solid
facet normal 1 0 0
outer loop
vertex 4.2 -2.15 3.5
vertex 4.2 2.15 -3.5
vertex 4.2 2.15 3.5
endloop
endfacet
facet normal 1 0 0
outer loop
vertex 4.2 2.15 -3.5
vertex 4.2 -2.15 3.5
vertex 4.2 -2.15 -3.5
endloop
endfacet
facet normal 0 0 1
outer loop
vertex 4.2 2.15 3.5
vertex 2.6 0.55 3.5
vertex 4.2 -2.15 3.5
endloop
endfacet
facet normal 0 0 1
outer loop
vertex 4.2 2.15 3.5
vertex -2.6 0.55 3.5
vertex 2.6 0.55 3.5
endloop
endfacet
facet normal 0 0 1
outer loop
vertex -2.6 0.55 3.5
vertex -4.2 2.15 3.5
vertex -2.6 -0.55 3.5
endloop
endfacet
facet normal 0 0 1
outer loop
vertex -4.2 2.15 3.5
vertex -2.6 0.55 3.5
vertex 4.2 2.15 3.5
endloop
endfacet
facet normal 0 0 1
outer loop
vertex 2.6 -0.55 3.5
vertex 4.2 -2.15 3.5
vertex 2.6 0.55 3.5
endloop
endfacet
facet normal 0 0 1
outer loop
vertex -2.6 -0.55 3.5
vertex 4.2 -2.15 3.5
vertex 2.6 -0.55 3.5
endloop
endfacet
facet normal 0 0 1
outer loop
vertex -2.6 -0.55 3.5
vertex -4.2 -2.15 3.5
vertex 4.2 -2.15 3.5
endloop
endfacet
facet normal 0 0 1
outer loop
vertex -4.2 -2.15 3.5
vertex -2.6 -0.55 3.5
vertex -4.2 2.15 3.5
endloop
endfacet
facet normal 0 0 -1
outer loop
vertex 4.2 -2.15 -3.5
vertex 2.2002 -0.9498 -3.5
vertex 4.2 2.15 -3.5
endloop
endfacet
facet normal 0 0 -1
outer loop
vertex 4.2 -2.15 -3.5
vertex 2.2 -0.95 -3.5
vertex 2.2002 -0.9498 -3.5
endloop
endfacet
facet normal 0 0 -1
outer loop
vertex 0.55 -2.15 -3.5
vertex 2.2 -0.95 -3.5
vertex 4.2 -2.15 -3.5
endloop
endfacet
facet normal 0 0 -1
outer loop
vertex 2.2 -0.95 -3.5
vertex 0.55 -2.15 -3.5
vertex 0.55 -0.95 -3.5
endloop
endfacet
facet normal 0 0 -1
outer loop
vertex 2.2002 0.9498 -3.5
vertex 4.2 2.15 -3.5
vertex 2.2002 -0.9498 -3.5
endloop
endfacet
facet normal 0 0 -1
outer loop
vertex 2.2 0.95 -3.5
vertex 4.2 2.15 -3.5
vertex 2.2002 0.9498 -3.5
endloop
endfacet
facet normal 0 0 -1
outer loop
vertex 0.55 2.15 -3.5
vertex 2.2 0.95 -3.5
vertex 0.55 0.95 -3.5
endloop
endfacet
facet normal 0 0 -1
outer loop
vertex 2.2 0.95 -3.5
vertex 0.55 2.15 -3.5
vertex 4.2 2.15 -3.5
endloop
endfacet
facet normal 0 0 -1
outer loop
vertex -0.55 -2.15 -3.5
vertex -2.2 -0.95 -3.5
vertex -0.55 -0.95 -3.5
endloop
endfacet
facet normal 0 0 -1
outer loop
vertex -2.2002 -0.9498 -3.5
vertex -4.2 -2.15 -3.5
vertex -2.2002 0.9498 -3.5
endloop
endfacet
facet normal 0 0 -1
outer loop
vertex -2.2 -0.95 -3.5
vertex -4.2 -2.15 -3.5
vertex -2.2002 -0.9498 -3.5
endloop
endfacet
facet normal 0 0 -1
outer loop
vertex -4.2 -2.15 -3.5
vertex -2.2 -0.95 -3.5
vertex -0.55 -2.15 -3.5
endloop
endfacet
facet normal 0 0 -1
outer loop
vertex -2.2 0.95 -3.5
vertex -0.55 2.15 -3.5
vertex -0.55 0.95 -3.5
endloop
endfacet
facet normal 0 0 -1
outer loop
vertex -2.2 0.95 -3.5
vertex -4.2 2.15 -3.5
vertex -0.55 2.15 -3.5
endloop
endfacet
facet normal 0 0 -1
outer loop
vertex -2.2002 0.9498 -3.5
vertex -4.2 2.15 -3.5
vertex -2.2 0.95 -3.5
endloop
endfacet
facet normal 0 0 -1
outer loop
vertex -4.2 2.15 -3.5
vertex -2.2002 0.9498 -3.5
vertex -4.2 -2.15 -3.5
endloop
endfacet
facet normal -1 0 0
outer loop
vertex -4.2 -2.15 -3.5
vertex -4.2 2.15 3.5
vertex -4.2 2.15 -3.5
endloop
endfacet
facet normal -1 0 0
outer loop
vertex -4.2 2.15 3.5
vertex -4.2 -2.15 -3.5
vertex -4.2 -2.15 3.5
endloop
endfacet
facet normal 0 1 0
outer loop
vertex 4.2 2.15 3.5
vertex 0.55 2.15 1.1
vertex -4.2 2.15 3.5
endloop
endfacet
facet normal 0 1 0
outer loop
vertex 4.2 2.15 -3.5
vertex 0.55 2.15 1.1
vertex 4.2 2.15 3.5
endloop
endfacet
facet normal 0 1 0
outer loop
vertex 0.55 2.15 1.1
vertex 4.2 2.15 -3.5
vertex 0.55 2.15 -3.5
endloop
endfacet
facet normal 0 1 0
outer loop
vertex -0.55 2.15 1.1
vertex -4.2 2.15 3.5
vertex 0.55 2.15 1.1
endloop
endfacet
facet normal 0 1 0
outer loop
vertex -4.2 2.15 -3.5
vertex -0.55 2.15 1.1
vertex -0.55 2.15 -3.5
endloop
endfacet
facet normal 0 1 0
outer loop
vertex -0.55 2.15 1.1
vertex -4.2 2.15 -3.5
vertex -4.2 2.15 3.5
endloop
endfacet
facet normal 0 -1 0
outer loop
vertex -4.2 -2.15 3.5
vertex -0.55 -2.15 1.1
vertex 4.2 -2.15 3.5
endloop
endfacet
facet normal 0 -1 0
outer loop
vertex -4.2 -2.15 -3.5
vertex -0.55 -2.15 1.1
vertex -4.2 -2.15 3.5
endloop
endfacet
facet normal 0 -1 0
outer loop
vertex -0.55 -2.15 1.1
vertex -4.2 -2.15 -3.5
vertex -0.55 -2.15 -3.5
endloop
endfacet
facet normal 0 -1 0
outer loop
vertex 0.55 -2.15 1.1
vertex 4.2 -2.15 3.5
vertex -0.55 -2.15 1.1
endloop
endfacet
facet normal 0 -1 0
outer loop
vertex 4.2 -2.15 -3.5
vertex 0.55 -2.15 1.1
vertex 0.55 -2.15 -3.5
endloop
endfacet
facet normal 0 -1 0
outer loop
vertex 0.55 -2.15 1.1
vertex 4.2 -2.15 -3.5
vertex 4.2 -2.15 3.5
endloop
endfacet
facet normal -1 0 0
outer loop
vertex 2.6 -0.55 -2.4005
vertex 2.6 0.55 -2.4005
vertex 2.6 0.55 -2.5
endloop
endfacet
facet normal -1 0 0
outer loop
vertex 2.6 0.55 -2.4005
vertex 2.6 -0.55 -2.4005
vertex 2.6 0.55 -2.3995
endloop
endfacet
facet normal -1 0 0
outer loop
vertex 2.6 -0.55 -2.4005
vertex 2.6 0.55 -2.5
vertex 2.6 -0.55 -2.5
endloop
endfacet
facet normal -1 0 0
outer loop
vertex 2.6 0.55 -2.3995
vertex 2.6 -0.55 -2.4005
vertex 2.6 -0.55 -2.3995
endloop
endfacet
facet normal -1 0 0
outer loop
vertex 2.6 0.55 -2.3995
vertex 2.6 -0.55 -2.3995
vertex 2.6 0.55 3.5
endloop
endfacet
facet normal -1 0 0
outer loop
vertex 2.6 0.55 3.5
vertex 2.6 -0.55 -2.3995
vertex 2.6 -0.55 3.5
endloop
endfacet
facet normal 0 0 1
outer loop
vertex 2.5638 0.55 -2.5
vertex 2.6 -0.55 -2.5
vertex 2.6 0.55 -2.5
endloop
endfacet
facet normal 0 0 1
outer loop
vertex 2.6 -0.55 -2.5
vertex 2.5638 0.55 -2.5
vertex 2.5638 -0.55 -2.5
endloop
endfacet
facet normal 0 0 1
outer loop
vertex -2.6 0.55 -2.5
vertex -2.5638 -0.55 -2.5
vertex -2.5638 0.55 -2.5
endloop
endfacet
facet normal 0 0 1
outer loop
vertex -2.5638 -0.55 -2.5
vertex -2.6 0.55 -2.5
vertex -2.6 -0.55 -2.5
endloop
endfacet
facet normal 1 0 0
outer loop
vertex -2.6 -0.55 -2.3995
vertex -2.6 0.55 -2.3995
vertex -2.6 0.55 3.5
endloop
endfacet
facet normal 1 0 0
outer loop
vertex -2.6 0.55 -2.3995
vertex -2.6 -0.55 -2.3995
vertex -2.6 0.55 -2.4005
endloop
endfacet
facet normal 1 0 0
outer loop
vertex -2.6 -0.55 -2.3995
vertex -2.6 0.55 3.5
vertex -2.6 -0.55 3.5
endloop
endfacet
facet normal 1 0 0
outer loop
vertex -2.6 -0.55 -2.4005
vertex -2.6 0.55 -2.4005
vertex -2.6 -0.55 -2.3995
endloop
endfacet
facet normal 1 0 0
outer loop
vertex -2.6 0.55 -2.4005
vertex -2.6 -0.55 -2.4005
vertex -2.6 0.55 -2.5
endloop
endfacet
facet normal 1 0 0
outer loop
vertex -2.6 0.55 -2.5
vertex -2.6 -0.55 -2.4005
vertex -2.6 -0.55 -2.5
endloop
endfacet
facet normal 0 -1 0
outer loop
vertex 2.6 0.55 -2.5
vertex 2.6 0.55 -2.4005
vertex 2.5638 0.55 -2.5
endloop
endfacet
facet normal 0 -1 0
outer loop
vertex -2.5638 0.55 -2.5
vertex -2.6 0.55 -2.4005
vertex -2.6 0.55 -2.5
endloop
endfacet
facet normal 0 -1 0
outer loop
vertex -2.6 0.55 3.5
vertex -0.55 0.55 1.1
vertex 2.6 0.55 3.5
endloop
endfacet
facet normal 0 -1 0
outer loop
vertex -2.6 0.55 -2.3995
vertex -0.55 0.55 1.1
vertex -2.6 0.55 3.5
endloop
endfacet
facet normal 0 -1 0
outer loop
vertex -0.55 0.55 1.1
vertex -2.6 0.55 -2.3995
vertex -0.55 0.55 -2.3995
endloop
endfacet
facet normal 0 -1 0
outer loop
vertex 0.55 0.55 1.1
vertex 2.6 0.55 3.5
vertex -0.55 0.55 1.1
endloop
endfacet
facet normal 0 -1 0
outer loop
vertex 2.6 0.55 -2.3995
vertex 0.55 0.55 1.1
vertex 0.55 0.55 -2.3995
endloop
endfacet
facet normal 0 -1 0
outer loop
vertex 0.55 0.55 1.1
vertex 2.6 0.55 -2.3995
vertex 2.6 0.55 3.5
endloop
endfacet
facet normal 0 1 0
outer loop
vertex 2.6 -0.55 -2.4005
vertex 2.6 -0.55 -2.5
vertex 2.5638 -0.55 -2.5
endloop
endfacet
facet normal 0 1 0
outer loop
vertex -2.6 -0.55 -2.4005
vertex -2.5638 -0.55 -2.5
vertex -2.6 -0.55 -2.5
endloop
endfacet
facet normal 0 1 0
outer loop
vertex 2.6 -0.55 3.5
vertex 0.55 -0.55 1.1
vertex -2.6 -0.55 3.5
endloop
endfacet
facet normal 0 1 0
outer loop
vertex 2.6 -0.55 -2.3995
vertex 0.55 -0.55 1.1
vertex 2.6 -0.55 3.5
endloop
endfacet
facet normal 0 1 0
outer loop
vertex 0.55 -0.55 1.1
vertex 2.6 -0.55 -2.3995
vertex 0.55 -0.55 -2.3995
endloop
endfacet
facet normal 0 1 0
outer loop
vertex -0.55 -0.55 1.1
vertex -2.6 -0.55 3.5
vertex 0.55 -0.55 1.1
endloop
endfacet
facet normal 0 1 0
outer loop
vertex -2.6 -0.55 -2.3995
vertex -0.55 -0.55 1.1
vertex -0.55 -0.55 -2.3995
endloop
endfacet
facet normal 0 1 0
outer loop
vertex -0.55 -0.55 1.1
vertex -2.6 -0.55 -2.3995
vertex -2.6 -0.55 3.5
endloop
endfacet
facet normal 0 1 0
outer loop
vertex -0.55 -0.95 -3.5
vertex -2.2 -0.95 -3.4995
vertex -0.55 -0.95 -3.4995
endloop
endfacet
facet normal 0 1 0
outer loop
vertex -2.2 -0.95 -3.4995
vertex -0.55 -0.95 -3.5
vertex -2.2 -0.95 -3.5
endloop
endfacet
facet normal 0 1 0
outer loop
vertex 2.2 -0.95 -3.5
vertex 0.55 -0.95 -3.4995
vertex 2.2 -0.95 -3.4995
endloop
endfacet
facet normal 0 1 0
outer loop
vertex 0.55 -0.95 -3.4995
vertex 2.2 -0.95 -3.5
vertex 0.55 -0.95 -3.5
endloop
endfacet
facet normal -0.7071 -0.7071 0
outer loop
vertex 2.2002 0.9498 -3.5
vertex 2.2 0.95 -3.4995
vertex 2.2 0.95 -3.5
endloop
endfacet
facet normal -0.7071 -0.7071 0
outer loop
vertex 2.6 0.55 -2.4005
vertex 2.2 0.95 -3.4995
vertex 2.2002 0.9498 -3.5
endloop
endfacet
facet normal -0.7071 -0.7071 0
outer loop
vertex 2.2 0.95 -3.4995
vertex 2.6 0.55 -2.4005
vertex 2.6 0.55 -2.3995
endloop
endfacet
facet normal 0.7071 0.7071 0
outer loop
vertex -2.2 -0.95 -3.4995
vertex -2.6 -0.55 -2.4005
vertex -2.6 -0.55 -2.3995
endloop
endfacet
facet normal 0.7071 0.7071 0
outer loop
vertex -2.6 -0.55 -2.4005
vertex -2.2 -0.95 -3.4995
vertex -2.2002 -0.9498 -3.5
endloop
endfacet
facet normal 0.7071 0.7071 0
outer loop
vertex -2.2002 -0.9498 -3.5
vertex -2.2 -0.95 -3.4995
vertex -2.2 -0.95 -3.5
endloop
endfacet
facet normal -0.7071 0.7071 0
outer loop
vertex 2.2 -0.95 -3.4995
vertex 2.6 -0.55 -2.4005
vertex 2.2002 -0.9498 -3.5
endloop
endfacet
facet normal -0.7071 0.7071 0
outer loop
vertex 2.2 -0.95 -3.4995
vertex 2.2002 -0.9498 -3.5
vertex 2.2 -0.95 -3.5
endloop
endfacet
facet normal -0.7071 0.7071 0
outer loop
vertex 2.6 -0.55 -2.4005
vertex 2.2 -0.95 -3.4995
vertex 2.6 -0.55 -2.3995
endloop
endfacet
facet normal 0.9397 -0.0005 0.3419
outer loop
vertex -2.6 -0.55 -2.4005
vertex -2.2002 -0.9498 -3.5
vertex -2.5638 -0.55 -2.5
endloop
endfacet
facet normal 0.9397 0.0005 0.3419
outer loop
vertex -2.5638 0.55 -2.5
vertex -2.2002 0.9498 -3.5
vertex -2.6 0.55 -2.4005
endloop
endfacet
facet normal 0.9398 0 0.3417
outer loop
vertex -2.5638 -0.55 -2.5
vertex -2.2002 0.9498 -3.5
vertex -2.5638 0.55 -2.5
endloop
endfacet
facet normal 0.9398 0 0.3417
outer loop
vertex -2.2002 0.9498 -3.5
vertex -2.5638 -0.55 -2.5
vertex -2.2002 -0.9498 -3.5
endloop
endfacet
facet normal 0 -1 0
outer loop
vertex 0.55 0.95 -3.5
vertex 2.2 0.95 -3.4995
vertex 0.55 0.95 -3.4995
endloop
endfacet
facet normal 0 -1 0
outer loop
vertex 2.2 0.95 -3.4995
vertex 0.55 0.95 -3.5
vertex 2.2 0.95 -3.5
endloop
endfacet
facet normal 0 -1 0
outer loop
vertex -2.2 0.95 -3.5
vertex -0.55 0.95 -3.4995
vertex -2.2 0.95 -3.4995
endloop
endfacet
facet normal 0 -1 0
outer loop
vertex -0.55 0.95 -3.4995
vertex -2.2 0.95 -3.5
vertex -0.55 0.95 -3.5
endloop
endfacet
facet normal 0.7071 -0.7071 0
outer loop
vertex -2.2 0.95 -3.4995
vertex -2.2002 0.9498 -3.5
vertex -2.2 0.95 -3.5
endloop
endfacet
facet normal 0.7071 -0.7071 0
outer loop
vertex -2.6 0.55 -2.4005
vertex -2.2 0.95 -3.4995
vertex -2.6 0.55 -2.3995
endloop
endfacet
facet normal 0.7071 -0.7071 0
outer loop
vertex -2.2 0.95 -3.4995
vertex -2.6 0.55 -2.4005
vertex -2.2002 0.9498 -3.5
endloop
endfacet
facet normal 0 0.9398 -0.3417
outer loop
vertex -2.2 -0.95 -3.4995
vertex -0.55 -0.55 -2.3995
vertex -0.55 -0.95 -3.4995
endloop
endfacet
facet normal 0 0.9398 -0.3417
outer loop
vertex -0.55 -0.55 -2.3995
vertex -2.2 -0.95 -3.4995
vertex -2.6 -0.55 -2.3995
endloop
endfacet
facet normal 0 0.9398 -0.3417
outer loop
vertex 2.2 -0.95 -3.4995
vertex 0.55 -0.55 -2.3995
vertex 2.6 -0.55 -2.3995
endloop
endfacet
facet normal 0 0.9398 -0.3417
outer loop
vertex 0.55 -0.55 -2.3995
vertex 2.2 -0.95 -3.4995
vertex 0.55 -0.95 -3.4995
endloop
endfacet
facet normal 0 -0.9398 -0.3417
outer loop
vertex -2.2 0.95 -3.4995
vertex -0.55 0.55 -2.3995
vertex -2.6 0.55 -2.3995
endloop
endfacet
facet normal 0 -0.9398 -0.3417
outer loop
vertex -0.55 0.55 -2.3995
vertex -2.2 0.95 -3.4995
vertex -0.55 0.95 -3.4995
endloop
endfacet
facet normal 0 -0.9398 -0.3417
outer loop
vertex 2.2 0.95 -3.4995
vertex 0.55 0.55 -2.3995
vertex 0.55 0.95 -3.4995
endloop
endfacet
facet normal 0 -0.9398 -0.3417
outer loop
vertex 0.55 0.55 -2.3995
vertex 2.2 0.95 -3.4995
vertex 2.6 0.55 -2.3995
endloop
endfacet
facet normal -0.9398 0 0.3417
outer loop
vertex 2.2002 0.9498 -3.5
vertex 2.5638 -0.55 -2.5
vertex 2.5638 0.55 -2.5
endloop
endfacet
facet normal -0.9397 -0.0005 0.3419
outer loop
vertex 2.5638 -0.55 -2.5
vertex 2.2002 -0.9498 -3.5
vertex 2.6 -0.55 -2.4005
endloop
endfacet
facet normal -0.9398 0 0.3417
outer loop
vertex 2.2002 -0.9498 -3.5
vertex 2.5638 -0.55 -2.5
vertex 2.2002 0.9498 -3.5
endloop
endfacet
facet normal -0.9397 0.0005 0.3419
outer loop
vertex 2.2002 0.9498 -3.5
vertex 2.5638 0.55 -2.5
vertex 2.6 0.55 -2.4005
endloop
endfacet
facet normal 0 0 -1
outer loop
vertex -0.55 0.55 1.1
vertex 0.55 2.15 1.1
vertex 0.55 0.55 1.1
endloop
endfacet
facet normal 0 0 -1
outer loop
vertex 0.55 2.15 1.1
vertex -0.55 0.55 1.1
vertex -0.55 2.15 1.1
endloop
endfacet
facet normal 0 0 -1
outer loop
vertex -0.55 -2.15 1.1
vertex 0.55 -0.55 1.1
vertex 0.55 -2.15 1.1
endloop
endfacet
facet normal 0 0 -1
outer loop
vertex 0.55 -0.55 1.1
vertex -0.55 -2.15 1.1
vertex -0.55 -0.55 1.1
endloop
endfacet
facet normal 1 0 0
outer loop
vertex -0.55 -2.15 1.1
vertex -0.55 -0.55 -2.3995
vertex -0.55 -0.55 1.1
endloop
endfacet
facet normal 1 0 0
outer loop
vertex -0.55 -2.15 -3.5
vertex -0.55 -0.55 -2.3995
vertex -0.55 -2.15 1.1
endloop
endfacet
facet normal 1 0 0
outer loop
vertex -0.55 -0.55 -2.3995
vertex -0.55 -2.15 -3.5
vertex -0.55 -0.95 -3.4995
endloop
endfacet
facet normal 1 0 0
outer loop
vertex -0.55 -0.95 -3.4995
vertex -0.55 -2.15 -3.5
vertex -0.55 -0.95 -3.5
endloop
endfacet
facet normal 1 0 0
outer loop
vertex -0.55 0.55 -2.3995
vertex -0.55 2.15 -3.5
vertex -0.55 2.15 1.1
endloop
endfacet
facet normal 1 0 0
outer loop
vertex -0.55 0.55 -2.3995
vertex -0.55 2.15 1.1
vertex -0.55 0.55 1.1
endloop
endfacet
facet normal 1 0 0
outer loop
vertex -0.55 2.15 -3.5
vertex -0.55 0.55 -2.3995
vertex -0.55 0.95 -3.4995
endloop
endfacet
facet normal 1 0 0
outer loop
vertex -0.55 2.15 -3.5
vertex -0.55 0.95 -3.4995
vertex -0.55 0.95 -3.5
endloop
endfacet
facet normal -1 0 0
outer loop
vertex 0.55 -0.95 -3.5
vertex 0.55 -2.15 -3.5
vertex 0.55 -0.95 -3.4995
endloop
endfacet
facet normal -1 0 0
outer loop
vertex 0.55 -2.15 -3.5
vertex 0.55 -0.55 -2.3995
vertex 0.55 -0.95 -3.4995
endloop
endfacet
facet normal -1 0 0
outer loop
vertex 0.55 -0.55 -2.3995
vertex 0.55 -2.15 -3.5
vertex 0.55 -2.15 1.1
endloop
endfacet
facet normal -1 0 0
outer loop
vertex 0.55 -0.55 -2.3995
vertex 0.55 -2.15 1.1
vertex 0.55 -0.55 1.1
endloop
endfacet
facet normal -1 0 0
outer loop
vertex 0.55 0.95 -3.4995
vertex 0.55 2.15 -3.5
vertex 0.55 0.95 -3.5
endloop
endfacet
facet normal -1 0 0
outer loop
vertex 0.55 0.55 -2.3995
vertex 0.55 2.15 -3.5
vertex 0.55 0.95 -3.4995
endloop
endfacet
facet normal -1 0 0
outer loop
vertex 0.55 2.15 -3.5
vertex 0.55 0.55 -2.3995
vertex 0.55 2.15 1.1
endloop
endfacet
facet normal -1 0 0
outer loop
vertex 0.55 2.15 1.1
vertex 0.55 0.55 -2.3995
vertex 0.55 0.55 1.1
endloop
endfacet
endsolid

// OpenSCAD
W=1.6;

THICK=.6+.5;
WIDTH=4.7+.5;
NECK=3.7+.5;
LEN=7;
S=.8;

difference() {
    cube([WIDTH+2*W,THICK+2*W,LEN],center=true);
    translate([0,0,1])
    cube([WIDTH,THICK,LEN],center=true);
        translate([0,0,-LEN/2])
   hull() {
        cube([WIDTH-W/2,THICK+W/2,.001],center=true);
        translate([0,0,1.1])
        cube([WIDTH,THICK,.001],center=true);
//        cube([NECK,THICK,LEN*2],center=true);
    }  
    
    translate([0,0,-1.5*W])
    rotate(90)
    cube([WIDTH,THICK,LEN],center=true);
//    translate([WIDTH/2-1,THICK/2,-LEN])
//    cube([WIDTH,S,LEN]);
}
